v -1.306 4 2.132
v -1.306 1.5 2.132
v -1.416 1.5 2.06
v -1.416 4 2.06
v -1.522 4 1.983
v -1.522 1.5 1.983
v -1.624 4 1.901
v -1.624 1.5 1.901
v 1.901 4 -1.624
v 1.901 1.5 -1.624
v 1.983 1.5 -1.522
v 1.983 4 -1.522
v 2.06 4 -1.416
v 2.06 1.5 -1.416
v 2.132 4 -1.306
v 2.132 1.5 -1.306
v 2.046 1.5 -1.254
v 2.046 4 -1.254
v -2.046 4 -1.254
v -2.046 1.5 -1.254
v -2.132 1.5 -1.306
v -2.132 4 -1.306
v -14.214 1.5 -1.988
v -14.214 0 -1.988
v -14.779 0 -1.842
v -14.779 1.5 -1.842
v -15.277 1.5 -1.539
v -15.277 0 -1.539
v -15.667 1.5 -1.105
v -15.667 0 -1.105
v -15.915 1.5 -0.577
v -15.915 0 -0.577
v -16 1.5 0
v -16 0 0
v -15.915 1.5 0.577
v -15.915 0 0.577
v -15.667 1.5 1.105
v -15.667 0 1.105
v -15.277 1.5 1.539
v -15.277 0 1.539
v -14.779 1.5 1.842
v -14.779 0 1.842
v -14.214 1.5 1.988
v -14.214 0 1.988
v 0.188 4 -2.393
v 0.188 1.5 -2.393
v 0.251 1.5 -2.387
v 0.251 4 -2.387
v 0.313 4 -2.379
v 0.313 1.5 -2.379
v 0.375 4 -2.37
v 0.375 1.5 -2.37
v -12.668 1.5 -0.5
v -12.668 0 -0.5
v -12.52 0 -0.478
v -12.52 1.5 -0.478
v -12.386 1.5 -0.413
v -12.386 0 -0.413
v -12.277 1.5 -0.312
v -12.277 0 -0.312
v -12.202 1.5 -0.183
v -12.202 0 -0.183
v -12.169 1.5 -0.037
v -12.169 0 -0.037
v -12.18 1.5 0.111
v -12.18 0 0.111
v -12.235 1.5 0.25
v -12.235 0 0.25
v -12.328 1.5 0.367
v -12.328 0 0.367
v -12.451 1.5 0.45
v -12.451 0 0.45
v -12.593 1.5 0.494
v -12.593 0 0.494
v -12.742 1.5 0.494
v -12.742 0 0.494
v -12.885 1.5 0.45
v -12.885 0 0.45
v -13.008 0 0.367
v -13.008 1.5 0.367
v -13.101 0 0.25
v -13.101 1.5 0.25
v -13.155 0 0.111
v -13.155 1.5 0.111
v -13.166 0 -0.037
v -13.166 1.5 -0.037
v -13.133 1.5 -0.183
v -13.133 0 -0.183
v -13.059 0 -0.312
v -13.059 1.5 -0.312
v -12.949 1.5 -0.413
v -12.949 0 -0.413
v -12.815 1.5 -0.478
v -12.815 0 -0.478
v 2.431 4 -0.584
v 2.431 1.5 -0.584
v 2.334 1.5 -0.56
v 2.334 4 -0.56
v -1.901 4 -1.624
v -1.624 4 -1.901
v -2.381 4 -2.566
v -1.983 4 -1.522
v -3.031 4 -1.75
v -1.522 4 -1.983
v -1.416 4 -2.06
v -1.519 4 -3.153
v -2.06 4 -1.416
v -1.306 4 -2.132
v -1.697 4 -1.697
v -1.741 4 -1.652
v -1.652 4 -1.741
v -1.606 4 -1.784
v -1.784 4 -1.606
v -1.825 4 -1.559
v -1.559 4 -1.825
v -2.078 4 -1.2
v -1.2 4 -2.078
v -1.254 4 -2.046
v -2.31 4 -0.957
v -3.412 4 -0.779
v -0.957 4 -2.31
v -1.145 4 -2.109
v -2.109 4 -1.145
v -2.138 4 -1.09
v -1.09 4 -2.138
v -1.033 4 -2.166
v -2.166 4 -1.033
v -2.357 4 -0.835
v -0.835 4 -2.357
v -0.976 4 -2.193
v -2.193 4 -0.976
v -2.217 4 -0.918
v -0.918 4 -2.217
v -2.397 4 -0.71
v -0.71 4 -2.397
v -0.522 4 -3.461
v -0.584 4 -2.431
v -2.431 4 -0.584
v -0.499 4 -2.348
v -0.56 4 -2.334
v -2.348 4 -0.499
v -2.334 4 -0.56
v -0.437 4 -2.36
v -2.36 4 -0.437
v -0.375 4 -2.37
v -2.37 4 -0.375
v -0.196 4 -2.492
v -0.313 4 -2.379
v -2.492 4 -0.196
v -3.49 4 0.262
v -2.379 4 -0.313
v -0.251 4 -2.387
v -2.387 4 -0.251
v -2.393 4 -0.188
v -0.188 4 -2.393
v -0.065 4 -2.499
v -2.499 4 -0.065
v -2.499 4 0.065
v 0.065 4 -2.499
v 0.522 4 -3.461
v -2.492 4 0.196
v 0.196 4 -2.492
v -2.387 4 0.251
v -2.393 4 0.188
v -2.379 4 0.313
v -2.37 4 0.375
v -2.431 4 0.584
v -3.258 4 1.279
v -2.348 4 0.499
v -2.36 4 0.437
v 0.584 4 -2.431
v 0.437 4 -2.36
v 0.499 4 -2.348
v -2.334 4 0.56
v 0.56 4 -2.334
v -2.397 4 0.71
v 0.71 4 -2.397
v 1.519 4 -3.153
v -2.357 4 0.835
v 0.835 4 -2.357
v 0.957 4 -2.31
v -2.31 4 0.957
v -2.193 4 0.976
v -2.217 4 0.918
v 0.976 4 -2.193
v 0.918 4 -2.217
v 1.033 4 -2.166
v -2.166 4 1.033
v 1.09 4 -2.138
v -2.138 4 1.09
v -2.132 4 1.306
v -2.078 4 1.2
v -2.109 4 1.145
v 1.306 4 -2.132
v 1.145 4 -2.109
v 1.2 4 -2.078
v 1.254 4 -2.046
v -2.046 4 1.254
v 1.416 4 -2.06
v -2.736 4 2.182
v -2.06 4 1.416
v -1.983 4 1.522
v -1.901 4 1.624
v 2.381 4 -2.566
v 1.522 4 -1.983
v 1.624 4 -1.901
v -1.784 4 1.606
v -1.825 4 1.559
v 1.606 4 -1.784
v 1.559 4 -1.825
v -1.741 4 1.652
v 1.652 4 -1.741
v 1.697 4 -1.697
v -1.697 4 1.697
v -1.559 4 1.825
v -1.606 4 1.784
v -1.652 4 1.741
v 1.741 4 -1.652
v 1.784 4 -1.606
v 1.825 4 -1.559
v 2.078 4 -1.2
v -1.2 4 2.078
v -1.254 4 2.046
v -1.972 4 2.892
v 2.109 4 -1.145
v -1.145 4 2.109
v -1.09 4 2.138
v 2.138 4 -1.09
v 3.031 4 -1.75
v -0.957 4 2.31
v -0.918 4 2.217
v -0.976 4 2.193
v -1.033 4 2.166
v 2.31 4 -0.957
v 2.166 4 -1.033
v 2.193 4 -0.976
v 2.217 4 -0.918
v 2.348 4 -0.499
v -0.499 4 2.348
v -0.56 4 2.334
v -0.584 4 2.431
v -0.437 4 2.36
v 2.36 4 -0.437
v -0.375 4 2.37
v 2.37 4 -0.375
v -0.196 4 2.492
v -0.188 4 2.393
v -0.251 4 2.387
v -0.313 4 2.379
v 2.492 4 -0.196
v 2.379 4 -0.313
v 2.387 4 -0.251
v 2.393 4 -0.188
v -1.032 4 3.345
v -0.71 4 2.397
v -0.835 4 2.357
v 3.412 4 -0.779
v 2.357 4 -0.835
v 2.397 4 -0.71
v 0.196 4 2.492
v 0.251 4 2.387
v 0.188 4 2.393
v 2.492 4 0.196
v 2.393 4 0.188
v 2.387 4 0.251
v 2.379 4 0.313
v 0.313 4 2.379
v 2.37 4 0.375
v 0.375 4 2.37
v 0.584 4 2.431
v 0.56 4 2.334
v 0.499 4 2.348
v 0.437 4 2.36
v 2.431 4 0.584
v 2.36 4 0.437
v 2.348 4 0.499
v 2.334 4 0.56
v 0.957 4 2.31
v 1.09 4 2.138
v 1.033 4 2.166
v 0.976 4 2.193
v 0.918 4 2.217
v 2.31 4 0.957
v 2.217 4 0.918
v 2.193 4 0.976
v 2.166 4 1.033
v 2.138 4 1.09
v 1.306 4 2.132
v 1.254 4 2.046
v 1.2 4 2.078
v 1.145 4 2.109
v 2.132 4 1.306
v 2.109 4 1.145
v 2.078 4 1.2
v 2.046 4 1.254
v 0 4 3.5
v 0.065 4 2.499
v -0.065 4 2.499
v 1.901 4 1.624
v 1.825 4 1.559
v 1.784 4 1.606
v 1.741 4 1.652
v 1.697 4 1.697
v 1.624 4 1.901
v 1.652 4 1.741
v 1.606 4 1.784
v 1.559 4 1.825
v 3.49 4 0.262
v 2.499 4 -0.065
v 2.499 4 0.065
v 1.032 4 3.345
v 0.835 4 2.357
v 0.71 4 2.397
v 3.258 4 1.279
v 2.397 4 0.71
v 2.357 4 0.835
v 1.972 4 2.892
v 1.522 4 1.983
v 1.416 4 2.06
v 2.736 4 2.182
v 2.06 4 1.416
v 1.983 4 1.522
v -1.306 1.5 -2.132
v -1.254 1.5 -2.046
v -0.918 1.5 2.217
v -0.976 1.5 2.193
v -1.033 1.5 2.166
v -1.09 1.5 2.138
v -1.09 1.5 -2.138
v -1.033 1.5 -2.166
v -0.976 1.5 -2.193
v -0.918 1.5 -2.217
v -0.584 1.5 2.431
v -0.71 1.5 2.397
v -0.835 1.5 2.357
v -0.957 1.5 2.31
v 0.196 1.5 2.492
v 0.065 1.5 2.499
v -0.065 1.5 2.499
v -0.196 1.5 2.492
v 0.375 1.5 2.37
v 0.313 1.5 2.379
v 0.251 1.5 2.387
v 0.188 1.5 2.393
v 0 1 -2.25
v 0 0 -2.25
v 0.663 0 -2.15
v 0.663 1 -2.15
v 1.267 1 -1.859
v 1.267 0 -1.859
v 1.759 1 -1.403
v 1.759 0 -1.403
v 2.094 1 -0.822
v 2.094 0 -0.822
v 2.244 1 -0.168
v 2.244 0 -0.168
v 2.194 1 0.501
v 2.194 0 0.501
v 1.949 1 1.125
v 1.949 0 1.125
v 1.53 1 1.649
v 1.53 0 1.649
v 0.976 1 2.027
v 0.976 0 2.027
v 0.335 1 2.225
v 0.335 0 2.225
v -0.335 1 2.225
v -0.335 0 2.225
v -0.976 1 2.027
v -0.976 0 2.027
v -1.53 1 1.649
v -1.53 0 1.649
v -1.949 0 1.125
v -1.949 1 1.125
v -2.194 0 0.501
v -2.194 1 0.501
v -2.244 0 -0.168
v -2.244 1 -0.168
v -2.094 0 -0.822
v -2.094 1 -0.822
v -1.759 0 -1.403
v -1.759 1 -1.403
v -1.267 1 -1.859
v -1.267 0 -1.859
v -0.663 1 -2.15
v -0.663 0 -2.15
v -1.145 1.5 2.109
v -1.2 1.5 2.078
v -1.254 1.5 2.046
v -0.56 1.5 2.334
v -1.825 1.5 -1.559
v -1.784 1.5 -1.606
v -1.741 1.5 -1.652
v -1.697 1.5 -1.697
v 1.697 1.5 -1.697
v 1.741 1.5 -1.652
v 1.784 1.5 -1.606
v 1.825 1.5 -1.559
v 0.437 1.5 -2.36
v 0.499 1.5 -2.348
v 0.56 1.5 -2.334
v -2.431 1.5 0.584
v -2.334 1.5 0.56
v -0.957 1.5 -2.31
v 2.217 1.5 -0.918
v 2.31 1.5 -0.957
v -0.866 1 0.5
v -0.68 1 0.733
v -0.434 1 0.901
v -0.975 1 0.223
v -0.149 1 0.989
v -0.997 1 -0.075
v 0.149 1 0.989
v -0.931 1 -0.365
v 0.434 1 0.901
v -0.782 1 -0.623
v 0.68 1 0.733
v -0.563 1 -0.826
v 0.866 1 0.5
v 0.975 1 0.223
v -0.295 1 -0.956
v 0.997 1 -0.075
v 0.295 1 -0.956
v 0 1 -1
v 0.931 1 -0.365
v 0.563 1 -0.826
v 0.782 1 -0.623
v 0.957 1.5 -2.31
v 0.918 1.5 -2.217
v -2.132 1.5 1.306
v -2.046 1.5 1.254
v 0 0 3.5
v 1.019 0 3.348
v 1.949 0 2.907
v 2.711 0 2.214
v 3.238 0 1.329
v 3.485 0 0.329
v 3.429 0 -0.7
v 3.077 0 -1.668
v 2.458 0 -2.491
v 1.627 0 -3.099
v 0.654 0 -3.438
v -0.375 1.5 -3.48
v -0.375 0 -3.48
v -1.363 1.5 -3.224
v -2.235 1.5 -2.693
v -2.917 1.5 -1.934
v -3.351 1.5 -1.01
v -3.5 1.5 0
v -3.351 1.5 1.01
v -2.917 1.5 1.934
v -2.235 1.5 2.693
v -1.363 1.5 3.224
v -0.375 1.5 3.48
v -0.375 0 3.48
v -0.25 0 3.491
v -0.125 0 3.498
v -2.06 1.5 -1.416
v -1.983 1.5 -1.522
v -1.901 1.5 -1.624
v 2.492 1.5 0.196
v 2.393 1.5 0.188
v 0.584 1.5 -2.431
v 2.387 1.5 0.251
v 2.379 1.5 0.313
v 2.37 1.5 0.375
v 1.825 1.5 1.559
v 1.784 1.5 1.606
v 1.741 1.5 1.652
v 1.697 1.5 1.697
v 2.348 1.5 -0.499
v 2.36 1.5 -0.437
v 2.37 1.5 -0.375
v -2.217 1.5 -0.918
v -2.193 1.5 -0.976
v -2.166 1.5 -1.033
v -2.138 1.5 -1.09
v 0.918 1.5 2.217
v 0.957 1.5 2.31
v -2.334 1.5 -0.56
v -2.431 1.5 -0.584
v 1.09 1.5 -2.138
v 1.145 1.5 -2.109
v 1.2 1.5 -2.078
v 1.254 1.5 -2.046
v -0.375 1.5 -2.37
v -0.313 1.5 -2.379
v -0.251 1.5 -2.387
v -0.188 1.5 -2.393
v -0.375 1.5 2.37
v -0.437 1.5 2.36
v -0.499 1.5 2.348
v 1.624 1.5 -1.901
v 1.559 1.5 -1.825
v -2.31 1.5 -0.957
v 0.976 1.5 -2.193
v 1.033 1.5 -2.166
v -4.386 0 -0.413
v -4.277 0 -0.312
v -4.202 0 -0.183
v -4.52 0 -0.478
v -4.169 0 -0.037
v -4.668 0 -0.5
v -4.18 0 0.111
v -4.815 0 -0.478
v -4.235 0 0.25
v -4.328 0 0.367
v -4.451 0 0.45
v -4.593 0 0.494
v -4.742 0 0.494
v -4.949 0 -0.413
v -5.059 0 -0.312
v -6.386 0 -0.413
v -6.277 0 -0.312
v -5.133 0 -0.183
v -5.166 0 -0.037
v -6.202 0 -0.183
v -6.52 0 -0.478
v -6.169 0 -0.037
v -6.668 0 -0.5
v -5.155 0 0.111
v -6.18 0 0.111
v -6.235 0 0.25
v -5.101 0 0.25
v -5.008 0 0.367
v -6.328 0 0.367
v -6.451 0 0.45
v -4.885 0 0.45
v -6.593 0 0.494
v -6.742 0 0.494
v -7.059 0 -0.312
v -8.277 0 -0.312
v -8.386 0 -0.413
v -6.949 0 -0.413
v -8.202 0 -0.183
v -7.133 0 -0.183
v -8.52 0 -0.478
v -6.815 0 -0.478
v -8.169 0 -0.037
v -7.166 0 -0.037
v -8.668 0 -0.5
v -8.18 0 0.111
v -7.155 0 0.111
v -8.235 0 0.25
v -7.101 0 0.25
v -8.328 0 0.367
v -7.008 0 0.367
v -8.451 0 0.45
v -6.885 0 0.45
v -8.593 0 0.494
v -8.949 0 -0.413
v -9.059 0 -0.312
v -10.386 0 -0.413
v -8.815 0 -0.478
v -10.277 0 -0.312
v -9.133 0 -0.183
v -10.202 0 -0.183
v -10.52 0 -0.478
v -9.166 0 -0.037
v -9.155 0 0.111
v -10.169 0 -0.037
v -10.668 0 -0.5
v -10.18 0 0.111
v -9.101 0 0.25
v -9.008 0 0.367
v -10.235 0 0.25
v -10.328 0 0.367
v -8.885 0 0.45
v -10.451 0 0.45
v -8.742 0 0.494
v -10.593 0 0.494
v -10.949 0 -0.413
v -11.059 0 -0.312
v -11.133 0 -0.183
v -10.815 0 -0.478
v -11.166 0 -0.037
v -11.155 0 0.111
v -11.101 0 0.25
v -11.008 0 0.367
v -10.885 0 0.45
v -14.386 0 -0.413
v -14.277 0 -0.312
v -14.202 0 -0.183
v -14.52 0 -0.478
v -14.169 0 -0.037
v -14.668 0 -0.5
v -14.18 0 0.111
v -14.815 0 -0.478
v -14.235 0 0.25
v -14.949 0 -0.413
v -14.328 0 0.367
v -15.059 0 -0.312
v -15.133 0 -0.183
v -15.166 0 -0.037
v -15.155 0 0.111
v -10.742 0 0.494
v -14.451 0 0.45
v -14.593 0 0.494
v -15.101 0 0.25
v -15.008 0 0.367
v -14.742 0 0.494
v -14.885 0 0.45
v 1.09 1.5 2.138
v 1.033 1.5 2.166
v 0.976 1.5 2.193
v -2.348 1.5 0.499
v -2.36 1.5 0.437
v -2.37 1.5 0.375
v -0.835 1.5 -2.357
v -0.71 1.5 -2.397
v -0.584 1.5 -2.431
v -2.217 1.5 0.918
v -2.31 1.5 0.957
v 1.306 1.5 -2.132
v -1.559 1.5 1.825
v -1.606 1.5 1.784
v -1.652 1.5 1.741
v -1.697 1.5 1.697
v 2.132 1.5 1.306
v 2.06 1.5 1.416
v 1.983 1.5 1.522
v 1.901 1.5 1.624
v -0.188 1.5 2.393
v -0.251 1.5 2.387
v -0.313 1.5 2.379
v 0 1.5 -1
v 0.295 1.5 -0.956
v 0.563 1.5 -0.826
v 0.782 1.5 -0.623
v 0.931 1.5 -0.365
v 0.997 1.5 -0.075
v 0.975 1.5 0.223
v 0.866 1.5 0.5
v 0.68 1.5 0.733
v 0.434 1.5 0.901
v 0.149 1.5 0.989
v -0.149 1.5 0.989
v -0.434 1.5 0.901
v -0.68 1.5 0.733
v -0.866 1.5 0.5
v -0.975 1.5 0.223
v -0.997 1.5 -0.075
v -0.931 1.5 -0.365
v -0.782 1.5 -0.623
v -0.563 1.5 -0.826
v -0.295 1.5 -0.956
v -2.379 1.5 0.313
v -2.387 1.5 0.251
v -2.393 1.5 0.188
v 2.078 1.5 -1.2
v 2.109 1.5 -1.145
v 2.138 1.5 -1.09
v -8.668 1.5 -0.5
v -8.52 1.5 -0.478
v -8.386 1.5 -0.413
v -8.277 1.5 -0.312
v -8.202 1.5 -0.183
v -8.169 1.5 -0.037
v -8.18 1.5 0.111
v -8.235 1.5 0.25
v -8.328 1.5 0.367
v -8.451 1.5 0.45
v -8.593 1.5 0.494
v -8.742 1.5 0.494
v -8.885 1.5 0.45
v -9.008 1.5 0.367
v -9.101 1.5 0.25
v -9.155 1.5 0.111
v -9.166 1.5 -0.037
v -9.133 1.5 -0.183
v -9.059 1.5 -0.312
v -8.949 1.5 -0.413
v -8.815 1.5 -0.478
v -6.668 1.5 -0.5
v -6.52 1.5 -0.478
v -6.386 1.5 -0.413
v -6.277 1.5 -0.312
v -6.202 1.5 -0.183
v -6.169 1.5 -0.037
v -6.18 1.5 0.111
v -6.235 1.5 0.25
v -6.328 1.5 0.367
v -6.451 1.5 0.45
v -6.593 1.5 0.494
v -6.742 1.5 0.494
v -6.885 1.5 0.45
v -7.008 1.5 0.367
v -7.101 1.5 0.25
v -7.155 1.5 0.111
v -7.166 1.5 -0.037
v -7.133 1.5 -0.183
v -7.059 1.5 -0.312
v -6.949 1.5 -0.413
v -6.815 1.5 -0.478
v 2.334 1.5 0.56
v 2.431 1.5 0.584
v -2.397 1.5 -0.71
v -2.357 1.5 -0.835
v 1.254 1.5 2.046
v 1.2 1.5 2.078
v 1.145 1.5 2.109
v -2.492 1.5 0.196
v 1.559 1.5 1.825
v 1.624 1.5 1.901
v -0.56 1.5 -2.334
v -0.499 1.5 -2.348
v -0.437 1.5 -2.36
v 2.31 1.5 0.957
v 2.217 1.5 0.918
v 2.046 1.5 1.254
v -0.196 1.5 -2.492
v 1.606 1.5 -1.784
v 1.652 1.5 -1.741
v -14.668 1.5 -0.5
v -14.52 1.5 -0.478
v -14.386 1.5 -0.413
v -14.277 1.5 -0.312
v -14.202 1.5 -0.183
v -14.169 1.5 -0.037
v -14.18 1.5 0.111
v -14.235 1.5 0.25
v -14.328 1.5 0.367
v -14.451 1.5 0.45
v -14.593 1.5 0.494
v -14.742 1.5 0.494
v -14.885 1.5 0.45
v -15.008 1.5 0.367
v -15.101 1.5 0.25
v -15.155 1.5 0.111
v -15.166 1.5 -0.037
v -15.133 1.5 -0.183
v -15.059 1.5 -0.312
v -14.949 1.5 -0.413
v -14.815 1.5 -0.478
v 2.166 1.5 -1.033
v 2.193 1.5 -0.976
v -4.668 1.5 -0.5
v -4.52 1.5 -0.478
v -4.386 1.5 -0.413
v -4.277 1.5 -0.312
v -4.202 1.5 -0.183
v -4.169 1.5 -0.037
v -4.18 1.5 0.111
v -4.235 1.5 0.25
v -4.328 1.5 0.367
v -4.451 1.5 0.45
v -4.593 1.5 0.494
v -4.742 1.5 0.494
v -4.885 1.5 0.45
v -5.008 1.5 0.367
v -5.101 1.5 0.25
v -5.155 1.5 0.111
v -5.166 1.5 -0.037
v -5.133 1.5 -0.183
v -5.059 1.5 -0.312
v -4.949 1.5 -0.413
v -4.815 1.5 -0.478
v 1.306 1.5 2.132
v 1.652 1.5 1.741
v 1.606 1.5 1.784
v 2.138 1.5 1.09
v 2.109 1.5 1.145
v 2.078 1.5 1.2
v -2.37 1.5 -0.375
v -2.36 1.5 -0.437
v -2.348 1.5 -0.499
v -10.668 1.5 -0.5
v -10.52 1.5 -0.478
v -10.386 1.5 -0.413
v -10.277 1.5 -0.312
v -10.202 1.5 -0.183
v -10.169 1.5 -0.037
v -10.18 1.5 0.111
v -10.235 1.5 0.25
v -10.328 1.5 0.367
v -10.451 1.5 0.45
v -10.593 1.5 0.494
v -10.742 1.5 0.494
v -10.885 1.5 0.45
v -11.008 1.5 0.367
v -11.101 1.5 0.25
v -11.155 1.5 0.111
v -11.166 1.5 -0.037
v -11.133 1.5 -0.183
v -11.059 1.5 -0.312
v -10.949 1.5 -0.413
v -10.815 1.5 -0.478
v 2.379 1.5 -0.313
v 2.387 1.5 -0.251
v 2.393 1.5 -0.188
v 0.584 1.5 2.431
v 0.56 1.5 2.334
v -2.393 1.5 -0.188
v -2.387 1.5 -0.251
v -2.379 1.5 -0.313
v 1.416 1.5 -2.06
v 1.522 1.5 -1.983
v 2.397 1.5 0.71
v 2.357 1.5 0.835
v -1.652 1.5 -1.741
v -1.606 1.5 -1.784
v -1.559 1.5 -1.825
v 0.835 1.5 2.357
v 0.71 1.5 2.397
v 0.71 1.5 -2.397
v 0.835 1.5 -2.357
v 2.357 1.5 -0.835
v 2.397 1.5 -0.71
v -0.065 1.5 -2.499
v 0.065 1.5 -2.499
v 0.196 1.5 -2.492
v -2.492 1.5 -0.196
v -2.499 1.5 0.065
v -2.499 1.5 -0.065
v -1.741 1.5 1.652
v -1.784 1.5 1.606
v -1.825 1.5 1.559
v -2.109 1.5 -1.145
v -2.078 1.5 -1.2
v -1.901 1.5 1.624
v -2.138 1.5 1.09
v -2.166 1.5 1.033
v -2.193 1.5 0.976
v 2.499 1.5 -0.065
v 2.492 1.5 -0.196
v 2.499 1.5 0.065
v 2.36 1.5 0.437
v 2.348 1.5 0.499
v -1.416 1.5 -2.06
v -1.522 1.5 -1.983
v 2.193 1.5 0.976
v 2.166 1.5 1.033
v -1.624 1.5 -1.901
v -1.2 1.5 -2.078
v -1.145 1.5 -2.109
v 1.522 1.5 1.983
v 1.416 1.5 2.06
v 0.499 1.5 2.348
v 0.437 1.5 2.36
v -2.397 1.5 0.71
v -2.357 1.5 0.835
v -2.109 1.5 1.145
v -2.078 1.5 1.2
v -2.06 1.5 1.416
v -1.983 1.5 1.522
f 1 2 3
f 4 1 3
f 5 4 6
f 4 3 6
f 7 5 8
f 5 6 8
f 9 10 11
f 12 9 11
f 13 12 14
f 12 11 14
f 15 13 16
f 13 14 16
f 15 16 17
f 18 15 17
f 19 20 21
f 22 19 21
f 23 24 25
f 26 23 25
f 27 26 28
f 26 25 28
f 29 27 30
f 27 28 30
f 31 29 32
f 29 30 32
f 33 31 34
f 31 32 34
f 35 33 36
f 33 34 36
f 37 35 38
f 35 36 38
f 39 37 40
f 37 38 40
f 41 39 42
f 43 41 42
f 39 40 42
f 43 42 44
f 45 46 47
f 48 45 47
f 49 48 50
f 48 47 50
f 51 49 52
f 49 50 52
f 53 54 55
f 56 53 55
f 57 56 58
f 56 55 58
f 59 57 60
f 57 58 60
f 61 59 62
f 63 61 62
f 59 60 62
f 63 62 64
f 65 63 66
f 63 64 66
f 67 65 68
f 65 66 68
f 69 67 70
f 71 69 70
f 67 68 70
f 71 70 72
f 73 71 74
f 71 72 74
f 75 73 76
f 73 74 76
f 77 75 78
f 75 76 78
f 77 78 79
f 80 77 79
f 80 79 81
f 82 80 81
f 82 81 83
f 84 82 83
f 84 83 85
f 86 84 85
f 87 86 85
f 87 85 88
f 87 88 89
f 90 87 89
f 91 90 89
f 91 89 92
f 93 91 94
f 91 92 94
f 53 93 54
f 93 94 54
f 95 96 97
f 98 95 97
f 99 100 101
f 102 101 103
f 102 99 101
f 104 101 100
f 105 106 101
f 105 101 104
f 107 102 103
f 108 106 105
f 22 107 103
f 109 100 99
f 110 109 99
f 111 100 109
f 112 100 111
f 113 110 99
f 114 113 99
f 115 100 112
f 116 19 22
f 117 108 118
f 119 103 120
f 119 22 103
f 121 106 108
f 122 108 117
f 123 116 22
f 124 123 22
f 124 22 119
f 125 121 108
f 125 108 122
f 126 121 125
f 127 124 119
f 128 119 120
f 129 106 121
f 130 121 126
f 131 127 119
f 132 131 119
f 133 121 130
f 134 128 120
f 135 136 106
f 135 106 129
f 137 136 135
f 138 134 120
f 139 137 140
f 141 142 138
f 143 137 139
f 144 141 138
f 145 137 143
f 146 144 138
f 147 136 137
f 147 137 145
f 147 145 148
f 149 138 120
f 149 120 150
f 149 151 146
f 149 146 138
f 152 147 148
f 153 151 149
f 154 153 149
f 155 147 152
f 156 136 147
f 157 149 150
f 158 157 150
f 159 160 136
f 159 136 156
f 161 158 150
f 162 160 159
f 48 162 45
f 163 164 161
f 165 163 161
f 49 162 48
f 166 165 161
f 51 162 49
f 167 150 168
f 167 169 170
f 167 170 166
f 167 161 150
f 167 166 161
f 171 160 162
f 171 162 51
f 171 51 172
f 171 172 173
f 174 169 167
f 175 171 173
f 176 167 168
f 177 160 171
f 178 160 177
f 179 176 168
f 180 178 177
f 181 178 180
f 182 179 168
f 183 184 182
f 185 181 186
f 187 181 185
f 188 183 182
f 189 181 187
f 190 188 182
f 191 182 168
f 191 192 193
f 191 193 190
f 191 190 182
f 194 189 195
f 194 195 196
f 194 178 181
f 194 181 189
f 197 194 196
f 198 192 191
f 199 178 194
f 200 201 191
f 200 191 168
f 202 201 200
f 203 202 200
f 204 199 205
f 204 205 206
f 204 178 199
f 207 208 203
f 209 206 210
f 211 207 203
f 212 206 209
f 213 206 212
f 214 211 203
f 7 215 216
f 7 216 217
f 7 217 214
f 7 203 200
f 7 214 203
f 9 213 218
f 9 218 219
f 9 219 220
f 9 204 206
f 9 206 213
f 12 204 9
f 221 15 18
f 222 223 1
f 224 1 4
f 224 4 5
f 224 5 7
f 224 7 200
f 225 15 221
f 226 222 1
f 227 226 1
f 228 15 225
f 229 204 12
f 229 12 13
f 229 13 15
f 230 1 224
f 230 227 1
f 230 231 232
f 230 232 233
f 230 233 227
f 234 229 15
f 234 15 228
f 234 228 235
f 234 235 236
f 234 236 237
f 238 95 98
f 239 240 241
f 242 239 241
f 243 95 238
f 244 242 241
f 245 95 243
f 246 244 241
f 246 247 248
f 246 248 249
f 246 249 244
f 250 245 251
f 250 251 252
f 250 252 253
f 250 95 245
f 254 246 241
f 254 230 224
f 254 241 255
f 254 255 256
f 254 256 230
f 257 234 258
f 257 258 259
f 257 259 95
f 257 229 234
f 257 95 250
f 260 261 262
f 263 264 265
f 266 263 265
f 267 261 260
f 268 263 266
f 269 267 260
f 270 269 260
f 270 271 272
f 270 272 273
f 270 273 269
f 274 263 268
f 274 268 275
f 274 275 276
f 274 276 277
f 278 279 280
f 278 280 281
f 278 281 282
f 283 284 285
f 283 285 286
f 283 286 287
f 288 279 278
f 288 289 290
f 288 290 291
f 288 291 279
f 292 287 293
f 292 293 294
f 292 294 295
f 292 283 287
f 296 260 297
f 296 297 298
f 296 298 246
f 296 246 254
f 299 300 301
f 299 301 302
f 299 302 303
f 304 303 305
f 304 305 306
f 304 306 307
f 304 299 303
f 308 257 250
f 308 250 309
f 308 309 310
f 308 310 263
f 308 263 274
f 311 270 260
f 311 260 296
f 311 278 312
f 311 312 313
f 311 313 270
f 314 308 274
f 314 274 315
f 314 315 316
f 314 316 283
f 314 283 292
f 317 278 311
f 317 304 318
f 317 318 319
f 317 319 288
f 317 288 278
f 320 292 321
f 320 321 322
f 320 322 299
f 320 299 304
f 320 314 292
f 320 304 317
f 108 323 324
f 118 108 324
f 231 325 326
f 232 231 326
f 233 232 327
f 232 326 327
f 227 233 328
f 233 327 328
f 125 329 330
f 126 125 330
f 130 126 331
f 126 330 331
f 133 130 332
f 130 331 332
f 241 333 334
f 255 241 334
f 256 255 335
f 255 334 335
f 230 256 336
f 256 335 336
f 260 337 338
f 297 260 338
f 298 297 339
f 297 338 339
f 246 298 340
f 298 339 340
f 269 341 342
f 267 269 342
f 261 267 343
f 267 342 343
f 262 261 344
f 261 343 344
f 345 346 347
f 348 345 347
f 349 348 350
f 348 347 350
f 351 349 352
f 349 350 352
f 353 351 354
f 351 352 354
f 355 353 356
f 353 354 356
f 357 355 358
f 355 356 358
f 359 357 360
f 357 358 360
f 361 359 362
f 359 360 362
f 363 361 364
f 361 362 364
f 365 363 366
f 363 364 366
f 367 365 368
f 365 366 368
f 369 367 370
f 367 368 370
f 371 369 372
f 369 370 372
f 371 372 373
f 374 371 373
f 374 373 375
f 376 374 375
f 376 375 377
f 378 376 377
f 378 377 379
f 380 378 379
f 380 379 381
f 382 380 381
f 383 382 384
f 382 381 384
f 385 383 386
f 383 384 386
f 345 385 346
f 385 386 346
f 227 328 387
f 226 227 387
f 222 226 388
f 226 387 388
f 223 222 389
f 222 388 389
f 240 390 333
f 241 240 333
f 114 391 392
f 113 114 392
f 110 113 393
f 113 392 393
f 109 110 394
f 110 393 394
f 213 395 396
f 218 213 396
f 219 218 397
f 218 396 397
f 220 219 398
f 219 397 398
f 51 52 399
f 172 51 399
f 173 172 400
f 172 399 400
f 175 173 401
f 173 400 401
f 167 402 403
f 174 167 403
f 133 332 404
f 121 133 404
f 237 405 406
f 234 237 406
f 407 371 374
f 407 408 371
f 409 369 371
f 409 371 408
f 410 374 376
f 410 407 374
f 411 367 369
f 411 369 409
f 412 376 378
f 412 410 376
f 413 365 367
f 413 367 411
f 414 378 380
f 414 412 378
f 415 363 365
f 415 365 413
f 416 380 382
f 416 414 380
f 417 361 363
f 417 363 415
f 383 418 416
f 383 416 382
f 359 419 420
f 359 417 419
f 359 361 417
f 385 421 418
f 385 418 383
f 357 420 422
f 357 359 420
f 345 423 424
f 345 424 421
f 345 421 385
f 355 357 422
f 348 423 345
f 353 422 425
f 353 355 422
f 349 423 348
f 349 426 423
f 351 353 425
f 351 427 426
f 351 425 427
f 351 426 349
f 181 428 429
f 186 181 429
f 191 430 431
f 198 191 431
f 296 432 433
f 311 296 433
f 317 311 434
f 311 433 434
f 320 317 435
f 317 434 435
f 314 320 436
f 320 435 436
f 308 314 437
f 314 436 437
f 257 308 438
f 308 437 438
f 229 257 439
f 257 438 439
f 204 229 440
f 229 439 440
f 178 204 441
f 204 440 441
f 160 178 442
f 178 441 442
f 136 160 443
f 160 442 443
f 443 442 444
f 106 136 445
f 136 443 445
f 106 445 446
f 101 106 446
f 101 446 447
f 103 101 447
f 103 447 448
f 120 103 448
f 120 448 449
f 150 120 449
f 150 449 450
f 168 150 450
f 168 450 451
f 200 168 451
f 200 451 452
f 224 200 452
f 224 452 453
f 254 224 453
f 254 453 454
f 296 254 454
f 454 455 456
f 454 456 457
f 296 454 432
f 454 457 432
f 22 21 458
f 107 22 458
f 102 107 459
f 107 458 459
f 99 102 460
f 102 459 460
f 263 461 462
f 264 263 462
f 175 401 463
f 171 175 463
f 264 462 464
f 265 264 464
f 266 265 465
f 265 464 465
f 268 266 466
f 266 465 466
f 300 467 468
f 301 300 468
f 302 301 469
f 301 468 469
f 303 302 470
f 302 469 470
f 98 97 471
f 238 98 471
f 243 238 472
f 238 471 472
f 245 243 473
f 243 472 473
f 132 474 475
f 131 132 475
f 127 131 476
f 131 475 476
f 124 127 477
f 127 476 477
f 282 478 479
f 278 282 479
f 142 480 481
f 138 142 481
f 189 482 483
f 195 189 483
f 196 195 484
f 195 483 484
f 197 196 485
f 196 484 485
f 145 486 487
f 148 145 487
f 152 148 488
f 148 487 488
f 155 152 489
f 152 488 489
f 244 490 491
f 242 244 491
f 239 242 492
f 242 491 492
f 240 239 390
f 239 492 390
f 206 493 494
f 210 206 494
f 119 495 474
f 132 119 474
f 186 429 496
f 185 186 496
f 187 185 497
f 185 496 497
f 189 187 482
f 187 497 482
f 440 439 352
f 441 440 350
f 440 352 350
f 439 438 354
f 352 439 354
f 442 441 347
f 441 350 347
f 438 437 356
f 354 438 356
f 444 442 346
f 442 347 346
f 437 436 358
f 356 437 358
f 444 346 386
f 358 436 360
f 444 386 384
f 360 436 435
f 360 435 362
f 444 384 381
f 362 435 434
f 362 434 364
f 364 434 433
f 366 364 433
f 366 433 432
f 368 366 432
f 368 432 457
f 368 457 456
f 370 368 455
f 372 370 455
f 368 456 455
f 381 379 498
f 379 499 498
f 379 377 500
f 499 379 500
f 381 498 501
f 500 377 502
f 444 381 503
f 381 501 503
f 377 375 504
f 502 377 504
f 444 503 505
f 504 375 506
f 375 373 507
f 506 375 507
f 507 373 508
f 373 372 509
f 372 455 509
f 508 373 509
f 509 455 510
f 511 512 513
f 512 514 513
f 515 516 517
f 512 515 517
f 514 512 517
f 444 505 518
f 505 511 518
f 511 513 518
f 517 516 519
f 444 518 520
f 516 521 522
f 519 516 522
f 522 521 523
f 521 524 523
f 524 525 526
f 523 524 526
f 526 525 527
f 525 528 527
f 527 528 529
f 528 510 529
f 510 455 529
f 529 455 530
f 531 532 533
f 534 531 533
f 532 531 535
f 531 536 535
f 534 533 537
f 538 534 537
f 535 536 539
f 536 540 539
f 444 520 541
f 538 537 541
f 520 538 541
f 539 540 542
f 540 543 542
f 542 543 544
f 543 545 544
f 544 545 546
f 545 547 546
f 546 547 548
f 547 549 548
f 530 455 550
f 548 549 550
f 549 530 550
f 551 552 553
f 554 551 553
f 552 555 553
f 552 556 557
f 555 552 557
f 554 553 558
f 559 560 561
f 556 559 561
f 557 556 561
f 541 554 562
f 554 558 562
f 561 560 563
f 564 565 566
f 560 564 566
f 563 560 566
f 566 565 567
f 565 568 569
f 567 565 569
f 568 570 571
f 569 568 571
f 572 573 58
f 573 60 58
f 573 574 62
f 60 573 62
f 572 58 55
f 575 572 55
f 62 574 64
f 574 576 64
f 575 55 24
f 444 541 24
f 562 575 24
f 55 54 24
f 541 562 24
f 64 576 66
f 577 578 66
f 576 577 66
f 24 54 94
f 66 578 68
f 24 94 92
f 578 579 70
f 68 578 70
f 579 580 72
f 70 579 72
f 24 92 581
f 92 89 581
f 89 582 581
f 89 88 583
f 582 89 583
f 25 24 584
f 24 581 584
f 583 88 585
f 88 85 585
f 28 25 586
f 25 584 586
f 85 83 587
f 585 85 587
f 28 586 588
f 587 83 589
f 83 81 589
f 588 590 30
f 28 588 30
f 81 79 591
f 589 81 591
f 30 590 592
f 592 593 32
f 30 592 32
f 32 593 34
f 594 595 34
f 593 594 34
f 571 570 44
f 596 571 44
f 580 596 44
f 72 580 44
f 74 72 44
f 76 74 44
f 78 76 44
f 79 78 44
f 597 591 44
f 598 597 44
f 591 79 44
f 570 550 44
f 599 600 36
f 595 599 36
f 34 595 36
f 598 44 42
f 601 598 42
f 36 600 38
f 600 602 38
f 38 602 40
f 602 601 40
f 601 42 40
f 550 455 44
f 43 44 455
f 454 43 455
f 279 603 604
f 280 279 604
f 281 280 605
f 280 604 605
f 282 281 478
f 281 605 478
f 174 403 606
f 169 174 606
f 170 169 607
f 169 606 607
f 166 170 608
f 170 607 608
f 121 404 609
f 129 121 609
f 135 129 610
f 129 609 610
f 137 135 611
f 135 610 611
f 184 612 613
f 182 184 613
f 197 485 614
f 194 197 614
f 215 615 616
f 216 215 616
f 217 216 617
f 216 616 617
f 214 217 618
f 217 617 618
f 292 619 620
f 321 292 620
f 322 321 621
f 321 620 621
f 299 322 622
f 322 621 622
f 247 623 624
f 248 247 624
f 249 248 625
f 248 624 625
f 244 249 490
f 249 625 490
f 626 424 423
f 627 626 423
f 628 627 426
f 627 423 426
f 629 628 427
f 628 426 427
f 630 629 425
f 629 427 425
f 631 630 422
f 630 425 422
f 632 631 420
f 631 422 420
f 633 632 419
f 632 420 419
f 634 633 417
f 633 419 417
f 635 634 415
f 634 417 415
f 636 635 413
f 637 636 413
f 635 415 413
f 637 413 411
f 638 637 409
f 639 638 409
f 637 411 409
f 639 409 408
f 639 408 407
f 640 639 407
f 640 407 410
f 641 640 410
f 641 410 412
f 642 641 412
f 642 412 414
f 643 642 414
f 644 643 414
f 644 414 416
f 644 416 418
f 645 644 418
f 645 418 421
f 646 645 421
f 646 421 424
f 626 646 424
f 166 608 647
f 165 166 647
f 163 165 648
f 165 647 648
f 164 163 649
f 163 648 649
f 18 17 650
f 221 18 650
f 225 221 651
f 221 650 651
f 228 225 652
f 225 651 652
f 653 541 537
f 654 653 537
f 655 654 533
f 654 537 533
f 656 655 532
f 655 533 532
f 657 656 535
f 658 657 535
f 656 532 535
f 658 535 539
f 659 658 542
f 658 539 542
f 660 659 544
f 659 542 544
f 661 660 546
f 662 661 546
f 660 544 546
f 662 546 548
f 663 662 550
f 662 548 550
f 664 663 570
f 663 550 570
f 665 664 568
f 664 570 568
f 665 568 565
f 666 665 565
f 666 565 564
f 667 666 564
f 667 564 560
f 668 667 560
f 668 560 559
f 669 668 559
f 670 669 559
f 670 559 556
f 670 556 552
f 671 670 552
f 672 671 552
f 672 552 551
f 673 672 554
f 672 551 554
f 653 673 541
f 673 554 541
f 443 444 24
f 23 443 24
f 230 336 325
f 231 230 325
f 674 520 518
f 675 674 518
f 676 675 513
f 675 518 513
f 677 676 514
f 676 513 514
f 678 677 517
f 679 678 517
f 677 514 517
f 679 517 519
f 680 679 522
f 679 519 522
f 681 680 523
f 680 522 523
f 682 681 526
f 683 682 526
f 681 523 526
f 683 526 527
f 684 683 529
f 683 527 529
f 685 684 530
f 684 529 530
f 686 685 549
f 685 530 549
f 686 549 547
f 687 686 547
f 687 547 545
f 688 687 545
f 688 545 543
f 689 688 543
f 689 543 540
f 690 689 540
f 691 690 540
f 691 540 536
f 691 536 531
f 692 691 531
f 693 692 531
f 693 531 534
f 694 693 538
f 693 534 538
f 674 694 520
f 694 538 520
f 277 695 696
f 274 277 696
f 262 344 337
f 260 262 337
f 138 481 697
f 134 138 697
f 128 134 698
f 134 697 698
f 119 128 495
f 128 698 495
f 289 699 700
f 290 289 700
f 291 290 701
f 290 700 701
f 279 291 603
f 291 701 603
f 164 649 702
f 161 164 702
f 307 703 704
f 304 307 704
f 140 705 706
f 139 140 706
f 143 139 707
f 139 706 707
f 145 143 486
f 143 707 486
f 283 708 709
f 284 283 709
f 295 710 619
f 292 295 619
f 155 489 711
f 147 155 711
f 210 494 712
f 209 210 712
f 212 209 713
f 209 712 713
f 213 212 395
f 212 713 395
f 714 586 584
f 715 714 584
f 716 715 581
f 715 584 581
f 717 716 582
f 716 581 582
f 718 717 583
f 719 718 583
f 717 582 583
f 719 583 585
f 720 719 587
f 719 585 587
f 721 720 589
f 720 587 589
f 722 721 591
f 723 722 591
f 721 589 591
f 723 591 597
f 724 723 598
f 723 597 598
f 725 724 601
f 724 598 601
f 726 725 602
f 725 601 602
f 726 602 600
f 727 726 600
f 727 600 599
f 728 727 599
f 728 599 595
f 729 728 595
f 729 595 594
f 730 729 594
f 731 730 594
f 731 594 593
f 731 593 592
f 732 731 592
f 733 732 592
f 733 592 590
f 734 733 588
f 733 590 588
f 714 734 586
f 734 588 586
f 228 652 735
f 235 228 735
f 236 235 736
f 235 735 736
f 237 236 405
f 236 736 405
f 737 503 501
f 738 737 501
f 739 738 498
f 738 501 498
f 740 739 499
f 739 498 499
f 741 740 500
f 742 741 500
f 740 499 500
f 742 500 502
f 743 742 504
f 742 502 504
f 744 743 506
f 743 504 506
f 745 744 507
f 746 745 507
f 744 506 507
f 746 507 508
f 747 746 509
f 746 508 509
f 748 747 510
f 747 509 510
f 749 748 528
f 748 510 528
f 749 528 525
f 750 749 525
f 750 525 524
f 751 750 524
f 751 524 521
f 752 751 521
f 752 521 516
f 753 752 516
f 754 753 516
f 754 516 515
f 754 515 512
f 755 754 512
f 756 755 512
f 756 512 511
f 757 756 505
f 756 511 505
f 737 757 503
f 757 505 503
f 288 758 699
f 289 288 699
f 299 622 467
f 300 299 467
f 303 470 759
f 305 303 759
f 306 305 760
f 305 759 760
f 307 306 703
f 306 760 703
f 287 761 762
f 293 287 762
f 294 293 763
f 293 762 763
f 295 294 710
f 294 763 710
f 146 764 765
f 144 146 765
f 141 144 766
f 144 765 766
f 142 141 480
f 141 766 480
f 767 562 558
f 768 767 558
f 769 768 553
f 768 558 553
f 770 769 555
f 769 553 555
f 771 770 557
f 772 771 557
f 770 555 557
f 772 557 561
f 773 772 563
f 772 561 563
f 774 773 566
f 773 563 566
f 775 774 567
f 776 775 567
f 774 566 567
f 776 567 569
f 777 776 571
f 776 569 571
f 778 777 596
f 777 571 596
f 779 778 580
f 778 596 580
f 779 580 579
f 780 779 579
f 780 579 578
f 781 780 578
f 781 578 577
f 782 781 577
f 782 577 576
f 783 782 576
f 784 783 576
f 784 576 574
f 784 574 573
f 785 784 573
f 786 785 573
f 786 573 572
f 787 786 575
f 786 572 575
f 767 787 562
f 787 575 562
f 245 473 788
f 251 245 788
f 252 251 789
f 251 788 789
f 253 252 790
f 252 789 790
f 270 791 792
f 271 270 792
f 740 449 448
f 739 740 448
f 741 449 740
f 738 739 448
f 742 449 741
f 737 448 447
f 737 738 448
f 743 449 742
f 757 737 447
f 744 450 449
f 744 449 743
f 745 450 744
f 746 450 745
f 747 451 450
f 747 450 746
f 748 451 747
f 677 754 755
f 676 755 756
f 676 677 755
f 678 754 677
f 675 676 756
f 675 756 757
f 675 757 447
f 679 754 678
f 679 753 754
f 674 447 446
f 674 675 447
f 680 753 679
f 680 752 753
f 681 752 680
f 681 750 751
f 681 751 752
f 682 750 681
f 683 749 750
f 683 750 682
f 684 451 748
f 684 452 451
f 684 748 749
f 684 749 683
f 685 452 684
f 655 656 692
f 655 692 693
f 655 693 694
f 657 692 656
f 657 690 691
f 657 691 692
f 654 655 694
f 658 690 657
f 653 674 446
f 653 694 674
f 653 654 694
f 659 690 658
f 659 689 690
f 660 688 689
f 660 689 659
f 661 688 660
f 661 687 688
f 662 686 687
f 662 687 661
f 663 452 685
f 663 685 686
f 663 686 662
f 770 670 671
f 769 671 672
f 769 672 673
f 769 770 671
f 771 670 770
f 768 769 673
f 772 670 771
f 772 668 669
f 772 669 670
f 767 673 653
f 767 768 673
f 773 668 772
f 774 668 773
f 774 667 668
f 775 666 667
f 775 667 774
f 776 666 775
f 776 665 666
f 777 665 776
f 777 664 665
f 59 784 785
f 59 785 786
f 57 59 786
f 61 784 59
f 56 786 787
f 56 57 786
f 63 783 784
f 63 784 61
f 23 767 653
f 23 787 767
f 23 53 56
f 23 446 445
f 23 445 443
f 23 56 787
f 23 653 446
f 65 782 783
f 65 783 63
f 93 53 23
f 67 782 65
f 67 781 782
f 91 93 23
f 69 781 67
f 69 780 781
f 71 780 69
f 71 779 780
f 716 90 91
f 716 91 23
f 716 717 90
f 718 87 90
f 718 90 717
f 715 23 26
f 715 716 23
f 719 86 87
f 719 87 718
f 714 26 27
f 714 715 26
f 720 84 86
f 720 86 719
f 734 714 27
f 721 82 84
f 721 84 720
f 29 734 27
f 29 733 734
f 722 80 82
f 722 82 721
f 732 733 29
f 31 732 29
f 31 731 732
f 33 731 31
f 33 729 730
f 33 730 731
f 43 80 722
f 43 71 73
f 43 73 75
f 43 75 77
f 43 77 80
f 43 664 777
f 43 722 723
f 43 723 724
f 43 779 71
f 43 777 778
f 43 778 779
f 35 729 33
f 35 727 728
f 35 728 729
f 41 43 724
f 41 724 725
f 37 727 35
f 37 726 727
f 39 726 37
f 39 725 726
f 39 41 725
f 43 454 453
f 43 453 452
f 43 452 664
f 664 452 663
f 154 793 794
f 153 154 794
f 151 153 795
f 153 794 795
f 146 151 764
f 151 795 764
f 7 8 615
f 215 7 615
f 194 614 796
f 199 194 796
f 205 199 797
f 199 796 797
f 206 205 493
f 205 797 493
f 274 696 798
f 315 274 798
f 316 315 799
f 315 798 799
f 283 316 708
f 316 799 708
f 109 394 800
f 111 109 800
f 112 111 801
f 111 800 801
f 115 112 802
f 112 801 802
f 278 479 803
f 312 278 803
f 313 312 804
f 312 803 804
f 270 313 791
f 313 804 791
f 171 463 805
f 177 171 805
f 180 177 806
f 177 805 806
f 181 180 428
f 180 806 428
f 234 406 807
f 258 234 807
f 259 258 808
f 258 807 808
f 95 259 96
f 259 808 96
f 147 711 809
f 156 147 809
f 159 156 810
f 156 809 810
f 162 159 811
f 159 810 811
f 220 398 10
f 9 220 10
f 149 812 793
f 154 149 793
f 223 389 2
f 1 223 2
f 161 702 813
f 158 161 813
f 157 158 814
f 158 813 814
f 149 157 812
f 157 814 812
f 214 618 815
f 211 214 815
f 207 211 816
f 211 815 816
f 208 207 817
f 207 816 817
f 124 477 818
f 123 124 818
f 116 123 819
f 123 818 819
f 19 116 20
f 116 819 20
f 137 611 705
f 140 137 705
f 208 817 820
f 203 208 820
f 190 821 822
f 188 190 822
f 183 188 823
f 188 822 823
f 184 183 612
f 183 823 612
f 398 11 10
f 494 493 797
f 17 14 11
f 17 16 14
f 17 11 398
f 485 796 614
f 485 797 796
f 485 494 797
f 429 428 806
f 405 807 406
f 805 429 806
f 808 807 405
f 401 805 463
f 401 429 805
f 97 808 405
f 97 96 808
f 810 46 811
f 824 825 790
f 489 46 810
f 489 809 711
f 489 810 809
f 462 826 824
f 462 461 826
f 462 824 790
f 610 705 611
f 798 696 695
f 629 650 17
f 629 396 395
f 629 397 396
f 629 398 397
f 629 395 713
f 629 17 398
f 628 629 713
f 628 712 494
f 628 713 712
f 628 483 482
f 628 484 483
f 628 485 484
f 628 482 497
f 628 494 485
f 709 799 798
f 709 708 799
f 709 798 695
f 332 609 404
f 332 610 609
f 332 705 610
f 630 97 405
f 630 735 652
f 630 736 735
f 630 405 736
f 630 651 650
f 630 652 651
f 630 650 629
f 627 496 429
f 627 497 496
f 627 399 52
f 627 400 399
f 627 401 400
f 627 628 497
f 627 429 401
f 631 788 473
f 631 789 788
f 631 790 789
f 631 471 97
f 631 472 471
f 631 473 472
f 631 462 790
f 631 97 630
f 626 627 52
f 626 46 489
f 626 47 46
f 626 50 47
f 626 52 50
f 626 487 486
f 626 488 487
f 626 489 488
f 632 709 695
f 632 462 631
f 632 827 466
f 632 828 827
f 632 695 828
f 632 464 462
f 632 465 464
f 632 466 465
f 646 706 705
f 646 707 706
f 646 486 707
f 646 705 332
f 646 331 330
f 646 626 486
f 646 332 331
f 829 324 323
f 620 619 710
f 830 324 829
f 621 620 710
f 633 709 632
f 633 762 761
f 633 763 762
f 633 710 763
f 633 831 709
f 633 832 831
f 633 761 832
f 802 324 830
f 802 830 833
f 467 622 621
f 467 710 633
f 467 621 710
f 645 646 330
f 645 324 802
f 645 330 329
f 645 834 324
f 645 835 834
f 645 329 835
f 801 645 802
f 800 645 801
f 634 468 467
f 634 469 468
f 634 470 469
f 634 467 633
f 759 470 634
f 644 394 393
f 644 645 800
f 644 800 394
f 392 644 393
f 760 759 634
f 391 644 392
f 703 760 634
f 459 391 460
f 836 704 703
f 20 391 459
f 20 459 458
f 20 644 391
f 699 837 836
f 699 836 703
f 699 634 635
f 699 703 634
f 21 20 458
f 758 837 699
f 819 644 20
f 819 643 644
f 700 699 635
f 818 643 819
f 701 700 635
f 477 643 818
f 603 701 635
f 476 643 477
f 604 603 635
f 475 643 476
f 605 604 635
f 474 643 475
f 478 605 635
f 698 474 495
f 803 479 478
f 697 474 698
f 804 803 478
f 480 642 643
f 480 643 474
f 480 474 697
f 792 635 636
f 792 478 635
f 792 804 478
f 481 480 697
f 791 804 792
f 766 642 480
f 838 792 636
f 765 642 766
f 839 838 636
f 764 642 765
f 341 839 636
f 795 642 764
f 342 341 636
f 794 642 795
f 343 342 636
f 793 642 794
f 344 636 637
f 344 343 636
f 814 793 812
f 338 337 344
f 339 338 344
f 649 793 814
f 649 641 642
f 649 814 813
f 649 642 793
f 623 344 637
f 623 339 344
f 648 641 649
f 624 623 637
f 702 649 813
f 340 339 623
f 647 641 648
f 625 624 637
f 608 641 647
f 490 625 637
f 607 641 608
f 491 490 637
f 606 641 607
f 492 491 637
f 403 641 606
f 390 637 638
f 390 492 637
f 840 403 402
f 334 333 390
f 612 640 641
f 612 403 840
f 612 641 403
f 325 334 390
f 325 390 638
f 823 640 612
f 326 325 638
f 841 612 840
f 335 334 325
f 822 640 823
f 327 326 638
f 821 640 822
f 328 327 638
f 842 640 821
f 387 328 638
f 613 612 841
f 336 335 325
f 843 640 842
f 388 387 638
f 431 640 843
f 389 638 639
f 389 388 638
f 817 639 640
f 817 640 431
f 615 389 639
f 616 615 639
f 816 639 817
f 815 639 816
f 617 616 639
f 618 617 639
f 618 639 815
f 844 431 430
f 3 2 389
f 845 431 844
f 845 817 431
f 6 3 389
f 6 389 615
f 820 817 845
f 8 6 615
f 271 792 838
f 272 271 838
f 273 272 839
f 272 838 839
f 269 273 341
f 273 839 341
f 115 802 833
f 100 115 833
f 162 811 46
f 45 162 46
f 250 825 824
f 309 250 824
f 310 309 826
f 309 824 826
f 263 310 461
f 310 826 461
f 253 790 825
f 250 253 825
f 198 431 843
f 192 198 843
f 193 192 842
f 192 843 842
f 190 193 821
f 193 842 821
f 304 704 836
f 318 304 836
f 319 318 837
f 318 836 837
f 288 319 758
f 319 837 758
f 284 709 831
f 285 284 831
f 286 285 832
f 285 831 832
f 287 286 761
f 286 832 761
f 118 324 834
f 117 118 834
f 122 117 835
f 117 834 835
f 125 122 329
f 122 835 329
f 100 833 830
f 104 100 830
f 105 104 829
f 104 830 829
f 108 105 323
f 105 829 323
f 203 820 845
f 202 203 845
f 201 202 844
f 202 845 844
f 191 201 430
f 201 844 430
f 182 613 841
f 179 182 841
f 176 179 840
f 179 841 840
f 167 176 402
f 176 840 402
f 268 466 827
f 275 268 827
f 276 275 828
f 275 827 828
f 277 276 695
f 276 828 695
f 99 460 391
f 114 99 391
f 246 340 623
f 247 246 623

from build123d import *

# Parameters (mm, degrees)
SKETCH1_R           = 3.5
BOSS_EXTRUDE1_DEPTH = 4
SKETCH2_R           = 1
SKETCH2_R_2         = 0.5
BOSS_EXTRUDE2_DEPTH = 1.5
SKETCH3_R           = 2.25
CUT_EXTRUDE1_DEPTH  = 1


with BuildPart() as part:
    # Sketch1 → Boss-Extrude1 (new body)
    with BuildSketch(Plane(origin=(0, 0, 0), x_dir=(1, 0, 0), z_dir=(0, 1, 0))):
        with Locations(Location((0, 0, 0), (0, 0, 270))):
            Circle(SKETCH1_R)
        with BuildLine():
            Line((2.392601601, 0.18830183), (2.492293334, 0.196147739))
            ThreePointArc((2.492293334, 0.196147739), (2.5, 0), (2.492293334, -0.196147739))
            Line((2.492293334, -0.196147739), (2.392601601, -0.18830183))
            ThreePointArc((2.392601601, -0.18830183), (2.383364297, -0.282089754), (2.370452017, -0.375442716))
            ThreePointArc((2.370452017, -0.375442716), (2.353884673, -0.468216773), (2.333687809, -0.560268873))
            Line((2.333687809, -0.560268873), (2.430924801, -0.58361341))
            ThreePointArc((2.430924801, -0.58361341), (2.377641291, -0.772542486), (2.309698831, -0.956708581))
            Line((2.309698831, -0.956708581), (2.217310878, -0.918440238))
            ThreePointArc((2.217310878, -0.918440238), (2.179543617, -1.00478337), (2.138415658, -1.089577199))
            ThreePointArc((2.138415658, -1.089577199), (2.093990417, -1.17269098), (2.046336394, -1.253996555))
            Line((2.046336394, -1.253996555), (2.131600411, -1.306246412))
            ThreePointArc((2.131600411, -1.306246412), (2.022542486, -1.469463131), (1.901014914, -1.623620121))
            Line((1.901014914, -1.623620121), (1.824974317, -1.558675316))
            ThreePointArc((1.824974317, -1.558675316), (1.762374023, -1.629121789), (1.697056275, -1.697056275))
            ThreePointArc((1.697056275, -1.697056275), (1.629121789, -1.762374023), (1.558675316, -1.824974317))
            Line((1.558675316, -1.824974317), (1.623620121, -1.901014914))
            ThreePointArc((1.623620121, -1.901014914), (1.469463131, -2.022542486), (1.306246412, -2.131600411))
            Line((1.306246412, -2.131600411), (1.253996555, -2.046336394))
            ThreePointArc((1.253996555, -2.046336394), (1.17269098, -2.093990417), (1.089577199, -2.138415658))
            ThreePointArc((1.089577199, -2.138415658), (1.00478337, -2.179543617), (0.918440238, -2.217310878))
            Line((0.918440238, -2.217310878), (0.956708581, -2.309698831))
            ThreePointArc((0.956708581, -2.309698831), (0.772542486, -2.377641291), (0.58361341, -2.430924801))
            Line((0.58361341, -2.430924801), (0.560268873, -2.333687809))
            ThreePointArc((0.560268873, -2.333687809), (0.468216773, -2.353884673), (0.375442716, -2.370452017))
            ThreePointArc((0.375442716, -2.370452017), (0.282089754, -2.383364297), (0.18830183, -2.392601601))
            Line((0.18830183, -2.392601601), (0.196147739, -2.492293334))
            ThreePointArc((0.196147739, -2.492293334), (0, -2.5), (-0.196147739, -2.492293334))
            Line((-0.196147739, -2.492293334), (-0.18830183, -2.392601601))
            ThreePointArc((-0.18830183, -2.392601601), (-0.282089754, -2.383364297), (-0.375442716, -2.370452017))
            ThreePointArc((-0.375442716, -2.370452017), (-0.468216773, -2.353884673), (-0.560268873, -2.333687809))
            Line((-0.560268873, -2.333687809), (-0.58361341, -2.430924801))
            ThreePointArc((-0.58361341, -2.430924801), (-0.772542486, -2.377641291), (-0.956708581, -2.309698831))
            Line((-0.956708581, -2.309698831), (-0.918440238, -2.217310878))
            ThreePointArc((-0.918440238, -2.217310878), (-1.00478337, -2.179543617), (-1.089577199, -2.138415658))
            ThreePointArc((-1.089577199, -2.138415658), (-1.17269098, -2.093990417), (-1.253996555, -2.046336394))
            Line((-1.253996555, -2.046336394), (-1.306246412, -2.131600411))
            ThreePointArc((-1.306246412, -2.131600411), (-1.469463131, -2.022542486), (-1.623620121, -1.901014914))
            Line((-1.623620121, -1.901014914), (-1.558675316, -1.824974317))
            ThreePointArc((-1.558675316, -1.824974317), (-1.629121789, -1.762374023), (-1.697056275, -1.697056275))
            ThreePointArc((-1.697056275, -1.697056275), (-1.762374023, -1.629121789), (-1.824974317, -1.558675316))
            Line((-1.824974317, -1.558675316), (-1.901014914, -1.623620121))
            ThreePointArc((-1.901014914, -1.623620121), (-2.022542486, -1.469463131), (-2.131600411, -1.306246412))
            Line((-2.131600411, -1.306246412), (-2.046336394, -1.253996555))
            ThreePointArc((-2.046336394, -1.253996555), (-2.093990417, -1.17269098), (-2.138415658, -1.089577199))
            ThreePointArc((-2.138415658, -1.089577199), (-2.179543617, -1.00478337), (-2.217310878, -0.918440238))
            Line((-2.217310878, -0.918440238), (-2.309698831, -0.956708581))
            ThreePointArc((-2.309698831, -0.956708581), (-2.377641291, -0.772542486), (-2.430924801, -0.58361341))
            Line((-2.430924801, -0.58361341), (-2.333687809, -0.560268873))
            ThreePointArc((-2.333687809, -0.560268873), (-2.353884673, -0.468216773), (-2.370452017, -0.375442716))
            ThreePointArc((-2.370452017, -0.375442716), (-2.383364297, -0.282089754), (-2.392601601, -0.18830183))
            Line((-2.392601601, -0.18830183), (-2.492293334, -0.196147739))
            ThreePointArc((-2.492293334, -0.196147739), (-2.5, 0), (-2.492293334, 0.196147739))
            Line((-2.492293334, 0.196147739), (-2.392601601, 0.18830183))
            ThreePointArc((-2.392601601, 0.18830183), (-2.383364297, 0.282089754), (-2.370452017, 0.375442716))
            ThreePointArc((-2.370452017, 0.375442716), (-2.353884673, 0.468216773), (-2.333687809, 0.560268873))
            Line((-2.333687809, 0.560268873), (-2.430924801, 0.58361341))
            ThreePointArc((-2.430924801, 0.58361341), (-2.377641291, 0.772542486), (-2.309698831, 0.956708581))
            Line((-2.309698831, 0.956708581), (-2.217310878, 0.918440238))
            ThreePointArc((-2.217310878, 0.918440238), (-2.179543617, 1.00478337), (-2.138415658, 1.089577199))
            ThreePointArc((-2.138415658, 1.089577199), (-2.093990417, 1.17269098), (-2.046336394, 1.253996555))
            Line((-2.046336394, 1.253996555), (-2.131600411, 1.306246412))
            ThreePointArc((-2.131600411, 1.306246412), (-2.022542486, 1.469463131), (-1.901014914, 1.623620121))
            Line((-1.901014914, 1.623620121), (-1.824974317, 1.558675316))
            ThreePointArc((-1.824974317, 1.558675316), (-1.762374023, 1.629121789), (-1.697056275, 1.697056275))
            ThreePointArc((-1.697056275, 1.697056275), (-1.629121789, 1.762374023), (-1.558675316, 1.824974317))
            Line((-1.558675316, 1.824974317), (-1.623620121, 1.901014914))
            ThreePointArc((-1.623620121, 1.901014914), (-1.469463131, 2.022542486), (-1.306246412, 2.131600411))
            Line((-1.306246412, 2.131600411), (-1.253996555, 2.046336394))
            ThreePointArc((-1.253996555, 2.046336394), (-1.17269098, 2.093990417), (-1.089577199, 2.138415658))
            ThreePointArc((-1.089577199, 2.138415658), (-1.00478337, 2.179543617), (-0.918440238, 2.217310878))
            Line((-0.918440238, 2.217310878), (-0.956708581, 2.309698831))
            ThreePointArc((-0.956708581, 2.309698831), (-0.772542486, 2.377641291), (-0.58361341, 2.430924801))
            Line((-0.58361341, 2.430924801), (-0.560268873, 2.333687809))
            ThreePointArc((-0.560268873, 2.333687809), (-0.468216773, 2.353884673), (-0.375442716, 2.370452017))
            ThreePointArc((-0.375442716, 2.370452017), (-0.282089754, 2.383364297), (-0.18830183, 2.392601601))
            Line((-0.18830183, 2.392601601), (-0.196147739, 2.492293334))
            ThreePointArc((-0.196147739, 2.492293334), (0, 2.5), (0.196147739, 2.492293334))
            Line((0.196147739, 2.492293334), (0.18830183, 2.392601601))
            ThreePointArc((0.18830183, 2.392601601), (0.282089754, 2.383364297), (0.375442716, 2.370452017))
            ThreePointArc((0.375442716, 2.370452017), (0.468216773, 2.353884673), (0.560268873, 2.333687809))
            Line((0.560268873, 2.333687809), (0.58361341, 2.430924801))
            ThreePointArc((0.58361341, 2.430924801), (0.772542486, 2.377641291), (0.956708581, 2.309698831))
            Line((0.956708581, 2.309698831), (0.918440238, 2.217310878))
            ThreePointArc((0.918440238, 2.217310878), (1.00478337, 2.179543617), (1.089577199, 2.138415658))
            ThreePointArc((1.089577199, 2.138415658), (1.17269098, 2.093990417), (1.253996555, 2.046336394))
            Line((1.253996555, 2.046336394), (1.306246412, 2.131600411))
            ThreePointArc((1.306246412, 2.131600411), (1.469463131, 2.022542486), (1.623620121, 1.901014914))
            Line((1.623620121, 1.901014914), (1.558675316, 1.824974317))
            ThreePointArc((1.558675316, 1.824974317), (1.629121789, 1.762374023), (1.697056275, 1.697056275))
            ThreePointArc((1.697056275, 1.697056275), (1.762374023, 1.629121789), (1.824974317, 1.558675316))
            Line((1.824974317, 1.558675316), (1.901014914, 1.623620121))
            ThreePointArc((1.901014914, 1.623620121), (2.022542486, 1.469463131), (2.131600411, 1.306246412))
            Line((2.131600411, 1.306246412), (2.046336394, 1.253996555))
            ThreePointArc((2.046336394, 1.253996555), (2.093990417, 1.17269098), (2.138415658, 1.089577199))
            ThreePointArc((2.138415658, 1.089577199), (2.179543617, 1.00478337), (2.217310878, 0.918440238))
            Line((2.217310878, 0.918440238), (2.309698831, 0.956708581))
            ThreePointArc((2.309698831, 0.956708581), (2.377641291, 0.772542486), (2.430924801, 0.58361341))
            Line((2.430924801, 0.58361341), (2.333687809, 0.560268873))
            ThreePointArc((2.333687809, 0.560268873), (2.353884673, 0.468216773), (2.370452017, 0.375442716))
            ThreePointArc((2.370452017, 0.375442716), (2.383364297, 0.282089754), (2.392601601, 0.18830183))
        make_face(mode=Mode.SUBTRACT)
    extrude(amount=BOSS_EXTRUDE1_DEPTH)

    # Sketch2 → Boss-Extrude2 (add)
    with BuildSketch(Plane.XZ):
        with BuildLine():
            Line((-14.214285714, 1.988487272), (-0.375, 3.479852727))
            ThreePointArc((-0.375, 3.479852727), (3.5, 0), (-0.375, -3.479852727))
            Line((-0.375, -3.479852727), (-14.214285714, -1.988487272))
            ThreePointArc((-14.214285714, -1.988487272), (-16, 0), (-14.214285714, 1.988487272))
        make_face()
        with Locations(Location((0, 0, 0), (0, 0, 270))):
            Circle(SKETCH2_R, mode=Mode.SUBTRACT)
        with Locations(Location((-14.667614311, 0, 0), (0, 0, 270))):
            Circle(SKETCH2_R_2, mode=Mode.SUBTRACT)
        with Locations(Location((-12.667614311, 0, 0), (0, 0, 270))):
            Circle(SKETCH2_R_2, mode=Mode.SUBTRACT)
        with Locations(Location((-10.667614311, 0, 0), (0, 0, 270))):
            Circle(SKETCH2_R_2, mode=Mode.SUBTRACT)
        with Locations(Location((-8.667614311, 0, 0), (0, 0, 270))):
            Circle(SKETCH2_R_2, mode=Mode.SUBTRACT)
        with Locations(Location((-6.667614311, 0, 0), (0, 0, 270))):
            Circle(SKETCH2_R_2, mode=Mode.SUBTRACT)
        with Locations(Location((-4.667614311, 0, 0), (0, 0, 270))):
            Circle(SKETCH2_R_2, mode=Mode.SUBTRACT)
    extrude(amount=-BOSS_EXTRUDE2_DEPTH)

    # Sketch3 → Cut-Extrude1 (cut)
    with BuildSketch(Plane(origin=(0, 0, 0), x_dir=(-1, 0, 0), z_dir=(0, -1, 0))):
        with Locations(Location((0, 0, 0), (0, 0, 90))):
            Circle(SKETCH3_R)
    extrude(amount=-CUT_EXTRUDE1_DEPTH, mode=Mode.SUBTRACT)


solid = part.part
